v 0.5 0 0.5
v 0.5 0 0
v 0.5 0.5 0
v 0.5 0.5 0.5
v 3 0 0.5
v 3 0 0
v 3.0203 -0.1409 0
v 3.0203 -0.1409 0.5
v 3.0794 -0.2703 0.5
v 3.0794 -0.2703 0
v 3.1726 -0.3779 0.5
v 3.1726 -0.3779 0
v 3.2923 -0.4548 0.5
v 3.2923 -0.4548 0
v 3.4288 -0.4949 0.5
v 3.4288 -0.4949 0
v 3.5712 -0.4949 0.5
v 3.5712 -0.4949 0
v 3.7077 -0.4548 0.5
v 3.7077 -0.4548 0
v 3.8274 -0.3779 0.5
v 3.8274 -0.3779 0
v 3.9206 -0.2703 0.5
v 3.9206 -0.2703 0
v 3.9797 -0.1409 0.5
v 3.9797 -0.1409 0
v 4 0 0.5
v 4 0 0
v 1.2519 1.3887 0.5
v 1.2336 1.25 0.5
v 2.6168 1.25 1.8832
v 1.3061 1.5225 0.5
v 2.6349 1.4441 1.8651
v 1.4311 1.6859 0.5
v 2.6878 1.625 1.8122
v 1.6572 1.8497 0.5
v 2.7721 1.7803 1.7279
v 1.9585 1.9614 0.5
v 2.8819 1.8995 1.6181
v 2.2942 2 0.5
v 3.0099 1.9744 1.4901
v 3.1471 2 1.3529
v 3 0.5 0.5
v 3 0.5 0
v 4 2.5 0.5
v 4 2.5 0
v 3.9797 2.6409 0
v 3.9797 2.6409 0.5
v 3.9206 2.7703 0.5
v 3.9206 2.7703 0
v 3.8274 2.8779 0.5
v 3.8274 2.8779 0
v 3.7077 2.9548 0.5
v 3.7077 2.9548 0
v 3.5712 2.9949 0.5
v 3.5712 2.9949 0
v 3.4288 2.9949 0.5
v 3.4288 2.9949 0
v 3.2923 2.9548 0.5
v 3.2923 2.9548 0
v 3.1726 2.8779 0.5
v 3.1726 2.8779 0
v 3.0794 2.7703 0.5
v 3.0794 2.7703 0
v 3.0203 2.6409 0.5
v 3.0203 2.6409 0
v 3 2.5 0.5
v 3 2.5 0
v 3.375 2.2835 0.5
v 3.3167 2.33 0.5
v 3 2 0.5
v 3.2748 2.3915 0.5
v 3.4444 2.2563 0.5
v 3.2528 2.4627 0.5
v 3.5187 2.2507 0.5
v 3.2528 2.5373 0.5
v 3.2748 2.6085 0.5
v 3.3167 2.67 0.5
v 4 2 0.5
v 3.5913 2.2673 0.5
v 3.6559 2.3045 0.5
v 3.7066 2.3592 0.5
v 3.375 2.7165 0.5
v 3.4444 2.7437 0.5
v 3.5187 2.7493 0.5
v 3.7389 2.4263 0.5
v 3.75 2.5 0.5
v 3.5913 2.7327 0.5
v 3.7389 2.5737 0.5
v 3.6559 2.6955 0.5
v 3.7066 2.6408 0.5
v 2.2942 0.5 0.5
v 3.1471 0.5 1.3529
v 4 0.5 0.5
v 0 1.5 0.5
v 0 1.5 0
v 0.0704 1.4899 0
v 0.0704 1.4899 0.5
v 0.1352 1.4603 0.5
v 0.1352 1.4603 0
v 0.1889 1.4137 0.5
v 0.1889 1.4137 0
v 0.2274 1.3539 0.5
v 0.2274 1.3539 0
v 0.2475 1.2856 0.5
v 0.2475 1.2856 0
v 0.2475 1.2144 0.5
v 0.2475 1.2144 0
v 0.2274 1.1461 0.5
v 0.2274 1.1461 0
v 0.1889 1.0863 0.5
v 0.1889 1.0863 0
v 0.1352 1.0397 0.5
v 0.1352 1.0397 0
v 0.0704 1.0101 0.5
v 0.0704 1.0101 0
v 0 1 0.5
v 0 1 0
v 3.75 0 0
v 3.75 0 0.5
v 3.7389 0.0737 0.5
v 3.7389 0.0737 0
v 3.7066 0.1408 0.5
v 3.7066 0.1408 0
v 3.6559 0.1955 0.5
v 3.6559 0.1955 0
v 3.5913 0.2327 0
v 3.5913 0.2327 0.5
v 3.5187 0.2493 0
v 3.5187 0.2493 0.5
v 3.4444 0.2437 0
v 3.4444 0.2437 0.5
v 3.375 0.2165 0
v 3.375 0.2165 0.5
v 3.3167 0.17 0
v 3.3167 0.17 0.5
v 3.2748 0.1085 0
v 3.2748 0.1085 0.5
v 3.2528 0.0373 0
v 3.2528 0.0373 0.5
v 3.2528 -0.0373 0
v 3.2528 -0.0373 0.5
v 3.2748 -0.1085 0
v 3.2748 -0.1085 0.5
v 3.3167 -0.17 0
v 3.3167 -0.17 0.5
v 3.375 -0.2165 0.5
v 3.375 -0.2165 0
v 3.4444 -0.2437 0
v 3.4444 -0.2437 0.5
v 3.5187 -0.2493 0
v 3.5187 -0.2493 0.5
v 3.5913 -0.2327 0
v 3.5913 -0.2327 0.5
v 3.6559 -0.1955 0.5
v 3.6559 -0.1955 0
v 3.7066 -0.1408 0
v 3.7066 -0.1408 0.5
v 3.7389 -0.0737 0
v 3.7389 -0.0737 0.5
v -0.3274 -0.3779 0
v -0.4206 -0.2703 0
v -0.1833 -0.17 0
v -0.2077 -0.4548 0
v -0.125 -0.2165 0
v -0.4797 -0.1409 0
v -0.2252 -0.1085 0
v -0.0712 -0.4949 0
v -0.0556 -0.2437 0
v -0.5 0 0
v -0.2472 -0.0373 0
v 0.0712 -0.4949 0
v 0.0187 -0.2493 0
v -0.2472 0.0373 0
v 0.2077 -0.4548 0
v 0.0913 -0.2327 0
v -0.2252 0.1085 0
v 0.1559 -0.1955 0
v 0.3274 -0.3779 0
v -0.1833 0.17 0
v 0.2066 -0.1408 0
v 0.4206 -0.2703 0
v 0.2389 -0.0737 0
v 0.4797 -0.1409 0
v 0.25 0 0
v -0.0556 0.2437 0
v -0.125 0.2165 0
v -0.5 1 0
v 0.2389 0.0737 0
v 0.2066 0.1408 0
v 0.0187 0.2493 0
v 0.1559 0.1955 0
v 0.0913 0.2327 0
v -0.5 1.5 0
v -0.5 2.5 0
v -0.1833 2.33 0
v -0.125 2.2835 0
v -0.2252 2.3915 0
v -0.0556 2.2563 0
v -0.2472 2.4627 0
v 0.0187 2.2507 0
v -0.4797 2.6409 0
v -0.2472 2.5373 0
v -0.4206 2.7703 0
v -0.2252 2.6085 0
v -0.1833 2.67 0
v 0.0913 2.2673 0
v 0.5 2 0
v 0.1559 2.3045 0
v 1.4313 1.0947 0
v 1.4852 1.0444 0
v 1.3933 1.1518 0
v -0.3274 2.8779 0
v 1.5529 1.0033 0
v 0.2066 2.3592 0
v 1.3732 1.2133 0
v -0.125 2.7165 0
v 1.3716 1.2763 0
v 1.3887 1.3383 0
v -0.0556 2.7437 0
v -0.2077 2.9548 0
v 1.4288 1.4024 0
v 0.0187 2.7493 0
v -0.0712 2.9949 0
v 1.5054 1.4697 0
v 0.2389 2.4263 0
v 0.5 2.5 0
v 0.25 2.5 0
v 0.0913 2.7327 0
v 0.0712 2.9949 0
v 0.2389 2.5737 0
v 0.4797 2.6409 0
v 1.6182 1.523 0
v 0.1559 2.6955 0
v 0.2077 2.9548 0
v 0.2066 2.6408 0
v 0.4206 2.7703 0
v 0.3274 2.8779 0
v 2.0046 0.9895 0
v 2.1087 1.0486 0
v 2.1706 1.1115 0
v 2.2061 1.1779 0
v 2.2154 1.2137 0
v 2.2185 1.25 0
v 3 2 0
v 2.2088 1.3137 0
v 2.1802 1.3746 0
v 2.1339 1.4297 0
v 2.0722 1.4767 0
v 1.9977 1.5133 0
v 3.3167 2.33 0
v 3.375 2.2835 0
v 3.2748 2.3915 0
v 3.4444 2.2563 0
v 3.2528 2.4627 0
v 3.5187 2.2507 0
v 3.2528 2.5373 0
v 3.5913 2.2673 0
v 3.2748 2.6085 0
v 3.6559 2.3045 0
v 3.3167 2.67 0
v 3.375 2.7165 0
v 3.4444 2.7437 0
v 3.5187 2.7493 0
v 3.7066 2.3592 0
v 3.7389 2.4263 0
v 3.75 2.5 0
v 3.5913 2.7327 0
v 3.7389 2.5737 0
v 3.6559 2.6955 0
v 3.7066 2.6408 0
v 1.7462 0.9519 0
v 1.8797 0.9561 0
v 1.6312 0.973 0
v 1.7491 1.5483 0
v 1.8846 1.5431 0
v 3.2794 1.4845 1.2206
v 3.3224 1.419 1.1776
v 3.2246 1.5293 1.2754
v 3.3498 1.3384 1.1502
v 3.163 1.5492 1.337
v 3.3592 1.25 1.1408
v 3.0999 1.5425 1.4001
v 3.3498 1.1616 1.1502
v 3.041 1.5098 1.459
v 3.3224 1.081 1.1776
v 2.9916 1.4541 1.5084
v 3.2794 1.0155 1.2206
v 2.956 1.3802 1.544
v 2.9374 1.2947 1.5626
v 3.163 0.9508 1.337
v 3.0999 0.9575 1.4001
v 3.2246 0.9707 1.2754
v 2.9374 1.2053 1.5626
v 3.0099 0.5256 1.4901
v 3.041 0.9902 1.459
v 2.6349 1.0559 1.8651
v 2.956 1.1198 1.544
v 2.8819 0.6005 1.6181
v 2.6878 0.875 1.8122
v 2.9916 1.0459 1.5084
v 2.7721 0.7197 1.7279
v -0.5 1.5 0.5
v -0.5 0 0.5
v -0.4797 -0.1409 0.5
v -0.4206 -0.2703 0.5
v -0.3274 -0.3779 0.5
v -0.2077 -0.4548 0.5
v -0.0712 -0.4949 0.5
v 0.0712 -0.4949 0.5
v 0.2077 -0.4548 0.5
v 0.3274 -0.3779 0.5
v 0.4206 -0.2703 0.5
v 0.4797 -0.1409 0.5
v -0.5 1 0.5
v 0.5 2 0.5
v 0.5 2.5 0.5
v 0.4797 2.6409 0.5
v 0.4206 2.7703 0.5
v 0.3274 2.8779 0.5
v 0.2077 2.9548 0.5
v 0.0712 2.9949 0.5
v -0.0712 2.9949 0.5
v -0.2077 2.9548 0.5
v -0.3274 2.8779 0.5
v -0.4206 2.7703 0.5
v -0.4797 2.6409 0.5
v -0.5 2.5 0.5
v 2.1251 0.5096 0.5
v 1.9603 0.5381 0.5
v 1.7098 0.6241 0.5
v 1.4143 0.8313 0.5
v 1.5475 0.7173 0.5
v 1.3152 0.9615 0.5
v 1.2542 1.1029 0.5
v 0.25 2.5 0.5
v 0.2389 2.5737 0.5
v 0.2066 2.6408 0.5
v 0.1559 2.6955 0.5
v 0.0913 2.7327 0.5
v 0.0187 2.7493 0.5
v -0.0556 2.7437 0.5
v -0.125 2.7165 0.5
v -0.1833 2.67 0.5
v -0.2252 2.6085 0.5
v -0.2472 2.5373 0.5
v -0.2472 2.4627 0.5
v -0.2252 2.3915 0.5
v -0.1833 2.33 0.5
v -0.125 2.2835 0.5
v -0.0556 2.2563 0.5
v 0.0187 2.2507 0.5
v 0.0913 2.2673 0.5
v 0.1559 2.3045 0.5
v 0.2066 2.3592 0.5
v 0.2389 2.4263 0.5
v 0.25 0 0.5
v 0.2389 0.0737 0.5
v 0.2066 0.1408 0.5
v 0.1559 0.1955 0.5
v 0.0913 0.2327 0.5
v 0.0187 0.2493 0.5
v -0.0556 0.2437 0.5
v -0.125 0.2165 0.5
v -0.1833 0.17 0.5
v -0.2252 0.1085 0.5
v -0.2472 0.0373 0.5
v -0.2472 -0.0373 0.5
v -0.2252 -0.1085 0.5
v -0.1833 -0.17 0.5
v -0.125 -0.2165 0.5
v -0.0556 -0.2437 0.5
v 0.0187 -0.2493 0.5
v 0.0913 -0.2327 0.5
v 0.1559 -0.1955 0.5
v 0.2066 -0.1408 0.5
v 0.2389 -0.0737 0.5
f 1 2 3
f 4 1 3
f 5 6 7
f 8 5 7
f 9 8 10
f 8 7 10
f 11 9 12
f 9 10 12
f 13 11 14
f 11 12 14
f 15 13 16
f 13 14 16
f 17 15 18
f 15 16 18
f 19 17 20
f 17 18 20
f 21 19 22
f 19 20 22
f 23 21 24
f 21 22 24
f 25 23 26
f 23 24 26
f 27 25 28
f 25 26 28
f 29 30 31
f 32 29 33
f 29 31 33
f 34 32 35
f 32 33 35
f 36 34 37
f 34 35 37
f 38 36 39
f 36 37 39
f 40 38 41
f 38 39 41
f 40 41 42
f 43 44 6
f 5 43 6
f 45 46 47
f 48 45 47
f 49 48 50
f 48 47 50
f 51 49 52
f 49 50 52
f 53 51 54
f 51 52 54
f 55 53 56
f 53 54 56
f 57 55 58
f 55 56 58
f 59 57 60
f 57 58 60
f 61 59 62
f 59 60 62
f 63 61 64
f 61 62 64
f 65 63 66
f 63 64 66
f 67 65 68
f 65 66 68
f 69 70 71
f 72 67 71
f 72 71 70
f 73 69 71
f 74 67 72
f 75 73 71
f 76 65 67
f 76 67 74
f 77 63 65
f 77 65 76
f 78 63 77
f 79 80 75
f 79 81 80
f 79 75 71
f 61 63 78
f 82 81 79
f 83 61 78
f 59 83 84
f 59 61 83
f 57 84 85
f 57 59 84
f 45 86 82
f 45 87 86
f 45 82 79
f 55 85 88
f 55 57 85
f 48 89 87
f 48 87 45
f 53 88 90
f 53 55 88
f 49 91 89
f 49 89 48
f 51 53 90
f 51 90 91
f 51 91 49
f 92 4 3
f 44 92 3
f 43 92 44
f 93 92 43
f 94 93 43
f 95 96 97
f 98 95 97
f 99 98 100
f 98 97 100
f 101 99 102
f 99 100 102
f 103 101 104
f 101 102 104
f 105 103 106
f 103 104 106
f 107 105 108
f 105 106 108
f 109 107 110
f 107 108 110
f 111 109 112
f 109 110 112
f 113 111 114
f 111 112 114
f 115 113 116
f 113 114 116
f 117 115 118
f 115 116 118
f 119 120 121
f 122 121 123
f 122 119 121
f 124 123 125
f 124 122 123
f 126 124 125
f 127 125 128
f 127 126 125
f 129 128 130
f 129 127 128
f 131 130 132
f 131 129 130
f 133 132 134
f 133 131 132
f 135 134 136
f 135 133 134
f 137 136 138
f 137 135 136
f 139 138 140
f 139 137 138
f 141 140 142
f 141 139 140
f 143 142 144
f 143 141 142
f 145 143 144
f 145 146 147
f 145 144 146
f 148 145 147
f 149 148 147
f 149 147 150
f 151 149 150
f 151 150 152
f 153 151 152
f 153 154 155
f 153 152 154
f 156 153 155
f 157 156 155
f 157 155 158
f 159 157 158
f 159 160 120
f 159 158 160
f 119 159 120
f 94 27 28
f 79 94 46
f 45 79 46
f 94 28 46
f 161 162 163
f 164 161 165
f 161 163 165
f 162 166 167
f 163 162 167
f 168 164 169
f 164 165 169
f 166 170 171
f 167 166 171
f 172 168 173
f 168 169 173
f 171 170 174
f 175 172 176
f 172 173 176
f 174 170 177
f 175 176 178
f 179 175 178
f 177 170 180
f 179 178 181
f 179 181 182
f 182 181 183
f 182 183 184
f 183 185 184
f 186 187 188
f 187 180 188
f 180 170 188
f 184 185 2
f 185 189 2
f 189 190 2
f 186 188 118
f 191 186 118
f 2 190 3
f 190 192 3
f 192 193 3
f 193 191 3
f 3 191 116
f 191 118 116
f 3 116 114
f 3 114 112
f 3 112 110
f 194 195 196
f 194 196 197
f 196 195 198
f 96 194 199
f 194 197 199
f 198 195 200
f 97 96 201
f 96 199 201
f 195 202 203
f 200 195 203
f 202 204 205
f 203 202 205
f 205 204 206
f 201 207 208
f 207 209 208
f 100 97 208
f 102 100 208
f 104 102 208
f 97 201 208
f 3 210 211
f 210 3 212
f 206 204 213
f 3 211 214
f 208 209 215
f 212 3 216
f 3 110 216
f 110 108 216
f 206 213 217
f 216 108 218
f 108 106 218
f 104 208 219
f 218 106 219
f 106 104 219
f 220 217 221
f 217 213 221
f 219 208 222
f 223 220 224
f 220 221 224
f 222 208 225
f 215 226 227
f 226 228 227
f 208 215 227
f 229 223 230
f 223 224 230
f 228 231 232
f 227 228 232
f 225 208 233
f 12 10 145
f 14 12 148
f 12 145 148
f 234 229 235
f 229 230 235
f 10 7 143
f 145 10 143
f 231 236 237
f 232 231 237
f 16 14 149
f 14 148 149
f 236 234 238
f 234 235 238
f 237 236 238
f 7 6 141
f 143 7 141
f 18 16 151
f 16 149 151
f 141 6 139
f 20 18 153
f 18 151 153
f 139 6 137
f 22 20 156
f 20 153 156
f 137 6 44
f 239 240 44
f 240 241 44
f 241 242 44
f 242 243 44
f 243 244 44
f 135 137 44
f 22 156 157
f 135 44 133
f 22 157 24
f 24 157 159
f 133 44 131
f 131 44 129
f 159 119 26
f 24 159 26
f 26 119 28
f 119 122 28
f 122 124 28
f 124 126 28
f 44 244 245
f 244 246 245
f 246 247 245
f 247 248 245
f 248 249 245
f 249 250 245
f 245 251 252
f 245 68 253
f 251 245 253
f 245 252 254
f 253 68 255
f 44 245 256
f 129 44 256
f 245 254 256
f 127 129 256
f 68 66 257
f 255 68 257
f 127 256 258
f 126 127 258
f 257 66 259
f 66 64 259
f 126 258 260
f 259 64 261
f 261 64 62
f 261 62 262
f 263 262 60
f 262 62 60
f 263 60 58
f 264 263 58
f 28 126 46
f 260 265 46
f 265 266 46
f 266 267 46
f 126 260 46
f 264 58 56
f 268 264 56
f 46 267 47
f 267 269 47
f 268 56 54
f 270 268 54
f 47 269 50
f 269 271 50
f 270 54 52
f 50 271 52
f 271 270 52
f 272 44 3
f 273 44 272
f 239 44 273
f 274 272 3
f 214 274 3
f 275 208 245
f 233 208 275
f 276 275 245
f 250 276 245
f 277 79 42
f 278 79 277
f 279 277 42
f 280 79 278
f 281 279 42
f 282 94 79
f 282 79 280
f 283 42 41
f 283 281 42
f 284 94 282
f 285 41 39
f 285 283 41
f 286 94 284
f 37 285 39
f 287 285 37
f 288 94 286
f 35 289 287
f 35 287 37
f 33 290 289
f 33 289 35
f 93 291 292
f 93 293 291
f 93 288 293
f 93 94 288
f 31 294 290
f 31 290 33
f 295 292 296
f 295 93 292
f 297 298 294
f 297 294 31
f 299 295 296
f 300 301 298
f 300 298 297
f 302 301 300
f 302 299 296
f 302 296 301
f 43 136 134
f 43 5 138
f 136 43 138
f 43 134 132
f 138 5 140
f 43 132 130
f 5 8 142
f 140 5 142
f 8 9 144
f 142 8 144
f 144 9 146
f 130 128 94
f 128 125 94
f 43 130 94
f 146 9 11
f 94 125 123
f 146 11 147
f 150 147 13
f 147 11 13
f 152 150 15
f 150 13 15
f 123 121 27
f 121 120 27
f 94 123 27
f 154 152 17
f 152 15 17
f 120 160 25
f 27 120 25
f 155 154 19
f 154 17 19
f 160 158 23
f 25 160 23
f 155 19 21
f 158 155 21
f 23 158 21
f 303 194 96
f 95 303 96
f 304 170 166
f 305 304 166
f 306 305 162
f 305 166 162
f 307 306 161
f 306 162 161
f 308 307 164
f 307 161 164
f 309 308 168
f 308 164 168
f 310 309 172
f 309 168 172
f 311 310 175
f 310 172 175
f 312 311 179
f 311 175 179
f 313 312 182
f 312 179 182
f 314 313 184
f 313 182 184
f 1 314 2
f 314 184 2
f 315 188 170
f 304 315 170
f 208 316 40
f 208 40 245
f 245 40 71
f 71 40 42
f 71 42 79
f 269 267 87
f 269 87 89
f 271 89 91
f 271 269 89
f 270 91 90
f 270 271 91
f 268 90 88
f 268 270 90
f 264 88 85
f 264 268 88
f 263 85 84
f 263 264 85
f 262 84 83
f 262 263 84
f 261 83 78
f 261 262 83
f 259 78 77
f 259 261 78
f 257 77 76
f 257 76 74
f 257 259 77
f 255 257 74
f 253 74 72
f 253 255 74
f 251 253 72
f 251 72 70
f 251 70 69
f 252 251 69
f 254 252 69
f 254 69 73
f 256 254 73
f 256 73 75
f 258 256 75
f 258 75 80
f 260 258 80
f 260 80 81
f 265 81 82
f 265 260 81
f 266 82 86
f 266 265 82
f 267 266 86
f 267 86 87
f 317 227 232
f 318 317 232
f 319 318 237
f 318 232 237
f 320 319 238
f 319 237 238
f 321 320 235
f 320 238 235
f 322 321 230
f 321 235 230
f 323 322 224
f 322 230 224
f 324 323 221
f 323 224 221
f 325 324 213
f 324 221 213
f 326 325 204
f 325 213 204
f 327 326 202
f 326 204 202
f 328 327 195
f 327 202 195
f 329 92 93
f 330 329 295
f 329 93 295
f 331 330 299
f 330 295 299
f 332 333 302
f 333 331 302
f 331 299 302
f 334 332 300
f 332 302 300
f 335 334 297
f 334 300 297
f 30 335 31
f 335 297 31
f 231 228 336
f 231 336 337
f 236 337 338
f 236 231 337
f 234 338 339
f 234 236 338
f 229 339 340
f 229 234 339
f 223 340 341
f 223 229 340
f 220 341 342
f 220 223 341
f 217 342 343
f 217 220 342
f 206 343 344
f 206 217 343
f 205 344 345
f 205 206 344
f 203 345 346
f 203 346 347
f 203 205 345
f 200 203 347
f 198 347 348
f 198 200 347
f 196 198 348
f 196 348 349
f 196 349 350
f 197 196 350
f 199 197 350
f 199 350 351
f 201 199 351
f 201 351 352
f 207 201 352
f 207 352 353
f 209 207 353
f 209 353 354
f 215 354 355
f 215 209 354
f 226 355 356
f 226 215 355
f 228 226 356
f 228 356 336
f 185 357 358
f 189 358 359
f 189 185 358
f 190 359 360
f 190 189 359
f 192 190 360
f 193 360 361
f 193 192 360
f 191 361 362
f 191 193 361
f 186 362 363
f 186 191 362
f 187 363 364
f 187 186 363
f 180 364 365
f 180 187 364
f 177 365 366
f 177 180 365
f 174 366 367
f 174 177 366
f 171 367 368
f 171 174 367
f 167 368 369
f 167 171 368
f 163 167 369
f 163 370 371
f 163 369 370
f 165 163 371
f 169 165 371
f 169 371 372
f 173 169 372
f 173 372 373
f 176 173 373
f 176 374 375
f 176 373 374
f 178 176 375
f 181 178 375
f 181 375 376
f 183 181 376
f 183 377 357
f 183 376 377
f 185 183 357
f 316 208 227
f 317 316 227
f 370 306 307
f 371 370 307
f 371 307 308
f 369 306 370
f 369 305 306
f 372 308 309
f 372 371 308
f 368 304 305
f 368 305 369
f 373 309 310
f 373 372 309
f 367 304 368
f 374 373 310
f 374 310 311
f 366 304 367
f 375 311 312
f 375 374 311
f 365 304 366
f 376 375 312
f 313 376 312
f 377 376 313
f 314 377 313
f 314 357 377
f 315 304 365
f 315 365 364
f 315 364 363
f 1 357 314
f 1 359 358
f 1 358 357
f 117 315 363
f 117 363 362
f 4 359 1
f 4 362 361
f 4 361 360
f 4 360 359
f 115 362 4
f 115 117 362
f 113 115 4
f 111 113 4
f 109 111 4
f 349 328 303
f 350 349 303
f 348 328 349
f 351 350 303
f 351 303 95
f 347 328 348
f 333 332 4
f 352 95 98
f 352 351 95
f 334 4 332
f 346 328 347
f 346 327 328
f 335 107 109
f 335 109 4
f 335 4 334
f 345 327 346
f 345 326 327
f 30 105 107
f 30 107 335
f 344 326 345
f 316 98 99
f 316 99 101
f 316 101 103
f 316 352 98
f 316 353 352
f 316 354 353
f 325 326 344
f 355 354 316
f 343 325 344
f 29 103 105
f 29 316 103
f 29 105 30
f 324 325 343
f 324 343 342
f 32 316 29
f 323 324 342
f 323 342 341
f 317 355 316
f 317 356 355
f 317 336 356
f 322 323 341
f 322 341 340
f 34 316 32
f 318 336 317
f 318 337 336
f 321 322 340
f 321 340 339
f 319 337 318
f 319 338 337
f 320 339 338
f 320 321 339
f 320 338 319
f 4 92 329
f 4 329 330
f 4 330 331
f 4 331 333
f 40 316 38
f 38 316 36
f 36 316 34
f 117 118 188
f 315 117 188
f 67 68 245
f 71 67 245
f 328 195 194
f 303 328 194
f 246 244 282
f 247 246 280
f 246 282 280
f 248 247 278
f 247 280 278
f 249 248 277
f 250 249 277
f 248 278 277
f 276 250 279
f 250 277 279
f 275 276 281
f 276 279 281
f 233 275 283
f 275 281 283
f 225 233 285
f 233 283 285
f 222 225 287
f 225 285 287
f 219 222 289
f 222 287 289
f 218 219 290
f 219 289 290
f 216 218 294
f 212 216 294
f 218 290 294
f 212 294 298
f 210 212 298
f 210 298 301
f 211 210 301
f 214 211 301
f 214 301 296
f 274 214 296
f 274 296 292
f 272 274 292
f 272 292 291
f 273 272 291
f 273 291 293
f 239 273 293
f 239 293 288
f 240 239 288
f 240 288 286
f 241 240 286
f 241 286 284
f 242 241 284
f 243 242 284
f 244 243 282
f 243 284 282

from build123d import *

# Parameters (mm, degrees)
F0_R     = 0.25
F1_DEPTH = 0.5
F3_DEPTH = 2
F4_W     = 4.4533928877
F4_H     = 2.379073936
F5_DEPTH = 0.5
F7_REACH = 4.5971940777
F8_R     = 0.3
F9_DEPTH = 25


with BuildPart() as f1:
    # F0 (on Top) → F1 (new body)
    with BuildSketch(Plane.XY):
        with BuildLine():
            Line((-0.5, 1), (-0.5, 0))
            ThreePointArc((-0.5, 0), (0, -0.5), (0.5, 0))
            Line((0.5, 0), (0.5, 0.5))
            Line((0.5, 0.5), (3, 0.5))
            Line((3, 0.5), (3, 0))
            ThreePointArc((3, 0), (3.5, -0.5), (4, 0))
            Line((4, 0), (4, 2.5))
            ThreePointArc((4, 2.5), (3.5, 3), (3, 2.5))
            Line((3, 2.5), (3, 2))
            Line((3, 2), (0.5, 2))
            Line((0.5, 2), (0.5, 2.5))
            ThreePointArc((0.5, 2.5), (0, 3), (-0.5, 2.5))
            Line((-0.5, 2.5), (-0.5, 1.5))
            Line((-0.5, 1.5), (0, 1.5))
            ThreePointArc((0, 1.5), (0.25, 1.25), (0, 1))
            Line((0, 1), (-0.5, 1))
        make_face()
        Circle(F0_R, mode=Mode.SUBTRACT)
        with Locations((3.5, 0)):
            Circle(F0_R, mode=Mode.SUBTRACT)
        with Locations((0, 2.5)):
            Circle(F0_R, mode=Mode.SUBTRACT)
        with Locations((3.5, 2.5)):
            Circle(F0_R, mode=Mode.SUBTRACT)
    extrude(amount=F1_DEPTH)

    # F2 (on Front) → F3 (join)
    with BuildSketch(Plane.XZ):
        Polygon((2.6167841171, 1.8832158829), (1.2335682341, 0.5), (4, 0.5), align=None)
    extrude(amount=-F3_DEPTH)

    # F4 (on Front) → F5 (cut)
    with BuildSketch(Plane.XZ):
        with Locations((1.7733035561, 1.689536968)):
            Rectangle(F4_W, F4_H)
    extrude(amount=-F5_DEPTH, mode=Mode.SUBTRACT)

    f7_end = Plane(origin=(0.2759630483, 1.25, 0.5), x_dir=(1, 0, 0), z_dir=(0, 0, 1))
    # F6 (on face) → F7 (cut, up to a plane its end follows)
    with BuildSketch(Plane(origin=(2.25, 0, 2.25), x_dir=(0.7071067812, 0, -0.7071067812), z_dir=(0.7071067812, 0, 0.7071067812))):
        with BuildLine():
            ThreePointArc((1.2687110728, 0.5), (0.7383809869, 0.7196699141), (0.5187110728, 1.25))
            Line((0.5187110728, 1.25), (0.5187110728, 0.5))
            Line((0.5187110728, 0.5), (1.2687110728, 0.5))
        make_face()
        with BuildLine():
            ThreePointArc((0.5187110728, 1.25), (0.7383809869, 1.7803300859), (1.2687110728, 2))
            Line((1.2687110728, 2), (0.5187110728, 2))
            Line((0.5187110728, 2), (0.5187110728, 1.25))
        make_face()
    f7_long = extrude(amount=-F7_REACH, mode=Mode.PRIVATE)
    add(split(f7_long, bisect_by=f7_end, keep=Keep.TOP, mode=Mode.PRIVATE), mode=Mode.SUBTRACT)

    # F8 (on face) → F9 (cut)
    with BuildSketch(Plane(origin=(2.25, 0, 2.25), x_dir=(0.7071067812, 0, -0.7071067812), z_dir=(0.7071067812, 0, 0.7071067812))):
        with Locations((1.2687110728, 1.25)):
            Circle(F8_R)
    extrude(amount=-F9_DEPTH, mode=Mode.SUBTRACT)


solid = f1.part
